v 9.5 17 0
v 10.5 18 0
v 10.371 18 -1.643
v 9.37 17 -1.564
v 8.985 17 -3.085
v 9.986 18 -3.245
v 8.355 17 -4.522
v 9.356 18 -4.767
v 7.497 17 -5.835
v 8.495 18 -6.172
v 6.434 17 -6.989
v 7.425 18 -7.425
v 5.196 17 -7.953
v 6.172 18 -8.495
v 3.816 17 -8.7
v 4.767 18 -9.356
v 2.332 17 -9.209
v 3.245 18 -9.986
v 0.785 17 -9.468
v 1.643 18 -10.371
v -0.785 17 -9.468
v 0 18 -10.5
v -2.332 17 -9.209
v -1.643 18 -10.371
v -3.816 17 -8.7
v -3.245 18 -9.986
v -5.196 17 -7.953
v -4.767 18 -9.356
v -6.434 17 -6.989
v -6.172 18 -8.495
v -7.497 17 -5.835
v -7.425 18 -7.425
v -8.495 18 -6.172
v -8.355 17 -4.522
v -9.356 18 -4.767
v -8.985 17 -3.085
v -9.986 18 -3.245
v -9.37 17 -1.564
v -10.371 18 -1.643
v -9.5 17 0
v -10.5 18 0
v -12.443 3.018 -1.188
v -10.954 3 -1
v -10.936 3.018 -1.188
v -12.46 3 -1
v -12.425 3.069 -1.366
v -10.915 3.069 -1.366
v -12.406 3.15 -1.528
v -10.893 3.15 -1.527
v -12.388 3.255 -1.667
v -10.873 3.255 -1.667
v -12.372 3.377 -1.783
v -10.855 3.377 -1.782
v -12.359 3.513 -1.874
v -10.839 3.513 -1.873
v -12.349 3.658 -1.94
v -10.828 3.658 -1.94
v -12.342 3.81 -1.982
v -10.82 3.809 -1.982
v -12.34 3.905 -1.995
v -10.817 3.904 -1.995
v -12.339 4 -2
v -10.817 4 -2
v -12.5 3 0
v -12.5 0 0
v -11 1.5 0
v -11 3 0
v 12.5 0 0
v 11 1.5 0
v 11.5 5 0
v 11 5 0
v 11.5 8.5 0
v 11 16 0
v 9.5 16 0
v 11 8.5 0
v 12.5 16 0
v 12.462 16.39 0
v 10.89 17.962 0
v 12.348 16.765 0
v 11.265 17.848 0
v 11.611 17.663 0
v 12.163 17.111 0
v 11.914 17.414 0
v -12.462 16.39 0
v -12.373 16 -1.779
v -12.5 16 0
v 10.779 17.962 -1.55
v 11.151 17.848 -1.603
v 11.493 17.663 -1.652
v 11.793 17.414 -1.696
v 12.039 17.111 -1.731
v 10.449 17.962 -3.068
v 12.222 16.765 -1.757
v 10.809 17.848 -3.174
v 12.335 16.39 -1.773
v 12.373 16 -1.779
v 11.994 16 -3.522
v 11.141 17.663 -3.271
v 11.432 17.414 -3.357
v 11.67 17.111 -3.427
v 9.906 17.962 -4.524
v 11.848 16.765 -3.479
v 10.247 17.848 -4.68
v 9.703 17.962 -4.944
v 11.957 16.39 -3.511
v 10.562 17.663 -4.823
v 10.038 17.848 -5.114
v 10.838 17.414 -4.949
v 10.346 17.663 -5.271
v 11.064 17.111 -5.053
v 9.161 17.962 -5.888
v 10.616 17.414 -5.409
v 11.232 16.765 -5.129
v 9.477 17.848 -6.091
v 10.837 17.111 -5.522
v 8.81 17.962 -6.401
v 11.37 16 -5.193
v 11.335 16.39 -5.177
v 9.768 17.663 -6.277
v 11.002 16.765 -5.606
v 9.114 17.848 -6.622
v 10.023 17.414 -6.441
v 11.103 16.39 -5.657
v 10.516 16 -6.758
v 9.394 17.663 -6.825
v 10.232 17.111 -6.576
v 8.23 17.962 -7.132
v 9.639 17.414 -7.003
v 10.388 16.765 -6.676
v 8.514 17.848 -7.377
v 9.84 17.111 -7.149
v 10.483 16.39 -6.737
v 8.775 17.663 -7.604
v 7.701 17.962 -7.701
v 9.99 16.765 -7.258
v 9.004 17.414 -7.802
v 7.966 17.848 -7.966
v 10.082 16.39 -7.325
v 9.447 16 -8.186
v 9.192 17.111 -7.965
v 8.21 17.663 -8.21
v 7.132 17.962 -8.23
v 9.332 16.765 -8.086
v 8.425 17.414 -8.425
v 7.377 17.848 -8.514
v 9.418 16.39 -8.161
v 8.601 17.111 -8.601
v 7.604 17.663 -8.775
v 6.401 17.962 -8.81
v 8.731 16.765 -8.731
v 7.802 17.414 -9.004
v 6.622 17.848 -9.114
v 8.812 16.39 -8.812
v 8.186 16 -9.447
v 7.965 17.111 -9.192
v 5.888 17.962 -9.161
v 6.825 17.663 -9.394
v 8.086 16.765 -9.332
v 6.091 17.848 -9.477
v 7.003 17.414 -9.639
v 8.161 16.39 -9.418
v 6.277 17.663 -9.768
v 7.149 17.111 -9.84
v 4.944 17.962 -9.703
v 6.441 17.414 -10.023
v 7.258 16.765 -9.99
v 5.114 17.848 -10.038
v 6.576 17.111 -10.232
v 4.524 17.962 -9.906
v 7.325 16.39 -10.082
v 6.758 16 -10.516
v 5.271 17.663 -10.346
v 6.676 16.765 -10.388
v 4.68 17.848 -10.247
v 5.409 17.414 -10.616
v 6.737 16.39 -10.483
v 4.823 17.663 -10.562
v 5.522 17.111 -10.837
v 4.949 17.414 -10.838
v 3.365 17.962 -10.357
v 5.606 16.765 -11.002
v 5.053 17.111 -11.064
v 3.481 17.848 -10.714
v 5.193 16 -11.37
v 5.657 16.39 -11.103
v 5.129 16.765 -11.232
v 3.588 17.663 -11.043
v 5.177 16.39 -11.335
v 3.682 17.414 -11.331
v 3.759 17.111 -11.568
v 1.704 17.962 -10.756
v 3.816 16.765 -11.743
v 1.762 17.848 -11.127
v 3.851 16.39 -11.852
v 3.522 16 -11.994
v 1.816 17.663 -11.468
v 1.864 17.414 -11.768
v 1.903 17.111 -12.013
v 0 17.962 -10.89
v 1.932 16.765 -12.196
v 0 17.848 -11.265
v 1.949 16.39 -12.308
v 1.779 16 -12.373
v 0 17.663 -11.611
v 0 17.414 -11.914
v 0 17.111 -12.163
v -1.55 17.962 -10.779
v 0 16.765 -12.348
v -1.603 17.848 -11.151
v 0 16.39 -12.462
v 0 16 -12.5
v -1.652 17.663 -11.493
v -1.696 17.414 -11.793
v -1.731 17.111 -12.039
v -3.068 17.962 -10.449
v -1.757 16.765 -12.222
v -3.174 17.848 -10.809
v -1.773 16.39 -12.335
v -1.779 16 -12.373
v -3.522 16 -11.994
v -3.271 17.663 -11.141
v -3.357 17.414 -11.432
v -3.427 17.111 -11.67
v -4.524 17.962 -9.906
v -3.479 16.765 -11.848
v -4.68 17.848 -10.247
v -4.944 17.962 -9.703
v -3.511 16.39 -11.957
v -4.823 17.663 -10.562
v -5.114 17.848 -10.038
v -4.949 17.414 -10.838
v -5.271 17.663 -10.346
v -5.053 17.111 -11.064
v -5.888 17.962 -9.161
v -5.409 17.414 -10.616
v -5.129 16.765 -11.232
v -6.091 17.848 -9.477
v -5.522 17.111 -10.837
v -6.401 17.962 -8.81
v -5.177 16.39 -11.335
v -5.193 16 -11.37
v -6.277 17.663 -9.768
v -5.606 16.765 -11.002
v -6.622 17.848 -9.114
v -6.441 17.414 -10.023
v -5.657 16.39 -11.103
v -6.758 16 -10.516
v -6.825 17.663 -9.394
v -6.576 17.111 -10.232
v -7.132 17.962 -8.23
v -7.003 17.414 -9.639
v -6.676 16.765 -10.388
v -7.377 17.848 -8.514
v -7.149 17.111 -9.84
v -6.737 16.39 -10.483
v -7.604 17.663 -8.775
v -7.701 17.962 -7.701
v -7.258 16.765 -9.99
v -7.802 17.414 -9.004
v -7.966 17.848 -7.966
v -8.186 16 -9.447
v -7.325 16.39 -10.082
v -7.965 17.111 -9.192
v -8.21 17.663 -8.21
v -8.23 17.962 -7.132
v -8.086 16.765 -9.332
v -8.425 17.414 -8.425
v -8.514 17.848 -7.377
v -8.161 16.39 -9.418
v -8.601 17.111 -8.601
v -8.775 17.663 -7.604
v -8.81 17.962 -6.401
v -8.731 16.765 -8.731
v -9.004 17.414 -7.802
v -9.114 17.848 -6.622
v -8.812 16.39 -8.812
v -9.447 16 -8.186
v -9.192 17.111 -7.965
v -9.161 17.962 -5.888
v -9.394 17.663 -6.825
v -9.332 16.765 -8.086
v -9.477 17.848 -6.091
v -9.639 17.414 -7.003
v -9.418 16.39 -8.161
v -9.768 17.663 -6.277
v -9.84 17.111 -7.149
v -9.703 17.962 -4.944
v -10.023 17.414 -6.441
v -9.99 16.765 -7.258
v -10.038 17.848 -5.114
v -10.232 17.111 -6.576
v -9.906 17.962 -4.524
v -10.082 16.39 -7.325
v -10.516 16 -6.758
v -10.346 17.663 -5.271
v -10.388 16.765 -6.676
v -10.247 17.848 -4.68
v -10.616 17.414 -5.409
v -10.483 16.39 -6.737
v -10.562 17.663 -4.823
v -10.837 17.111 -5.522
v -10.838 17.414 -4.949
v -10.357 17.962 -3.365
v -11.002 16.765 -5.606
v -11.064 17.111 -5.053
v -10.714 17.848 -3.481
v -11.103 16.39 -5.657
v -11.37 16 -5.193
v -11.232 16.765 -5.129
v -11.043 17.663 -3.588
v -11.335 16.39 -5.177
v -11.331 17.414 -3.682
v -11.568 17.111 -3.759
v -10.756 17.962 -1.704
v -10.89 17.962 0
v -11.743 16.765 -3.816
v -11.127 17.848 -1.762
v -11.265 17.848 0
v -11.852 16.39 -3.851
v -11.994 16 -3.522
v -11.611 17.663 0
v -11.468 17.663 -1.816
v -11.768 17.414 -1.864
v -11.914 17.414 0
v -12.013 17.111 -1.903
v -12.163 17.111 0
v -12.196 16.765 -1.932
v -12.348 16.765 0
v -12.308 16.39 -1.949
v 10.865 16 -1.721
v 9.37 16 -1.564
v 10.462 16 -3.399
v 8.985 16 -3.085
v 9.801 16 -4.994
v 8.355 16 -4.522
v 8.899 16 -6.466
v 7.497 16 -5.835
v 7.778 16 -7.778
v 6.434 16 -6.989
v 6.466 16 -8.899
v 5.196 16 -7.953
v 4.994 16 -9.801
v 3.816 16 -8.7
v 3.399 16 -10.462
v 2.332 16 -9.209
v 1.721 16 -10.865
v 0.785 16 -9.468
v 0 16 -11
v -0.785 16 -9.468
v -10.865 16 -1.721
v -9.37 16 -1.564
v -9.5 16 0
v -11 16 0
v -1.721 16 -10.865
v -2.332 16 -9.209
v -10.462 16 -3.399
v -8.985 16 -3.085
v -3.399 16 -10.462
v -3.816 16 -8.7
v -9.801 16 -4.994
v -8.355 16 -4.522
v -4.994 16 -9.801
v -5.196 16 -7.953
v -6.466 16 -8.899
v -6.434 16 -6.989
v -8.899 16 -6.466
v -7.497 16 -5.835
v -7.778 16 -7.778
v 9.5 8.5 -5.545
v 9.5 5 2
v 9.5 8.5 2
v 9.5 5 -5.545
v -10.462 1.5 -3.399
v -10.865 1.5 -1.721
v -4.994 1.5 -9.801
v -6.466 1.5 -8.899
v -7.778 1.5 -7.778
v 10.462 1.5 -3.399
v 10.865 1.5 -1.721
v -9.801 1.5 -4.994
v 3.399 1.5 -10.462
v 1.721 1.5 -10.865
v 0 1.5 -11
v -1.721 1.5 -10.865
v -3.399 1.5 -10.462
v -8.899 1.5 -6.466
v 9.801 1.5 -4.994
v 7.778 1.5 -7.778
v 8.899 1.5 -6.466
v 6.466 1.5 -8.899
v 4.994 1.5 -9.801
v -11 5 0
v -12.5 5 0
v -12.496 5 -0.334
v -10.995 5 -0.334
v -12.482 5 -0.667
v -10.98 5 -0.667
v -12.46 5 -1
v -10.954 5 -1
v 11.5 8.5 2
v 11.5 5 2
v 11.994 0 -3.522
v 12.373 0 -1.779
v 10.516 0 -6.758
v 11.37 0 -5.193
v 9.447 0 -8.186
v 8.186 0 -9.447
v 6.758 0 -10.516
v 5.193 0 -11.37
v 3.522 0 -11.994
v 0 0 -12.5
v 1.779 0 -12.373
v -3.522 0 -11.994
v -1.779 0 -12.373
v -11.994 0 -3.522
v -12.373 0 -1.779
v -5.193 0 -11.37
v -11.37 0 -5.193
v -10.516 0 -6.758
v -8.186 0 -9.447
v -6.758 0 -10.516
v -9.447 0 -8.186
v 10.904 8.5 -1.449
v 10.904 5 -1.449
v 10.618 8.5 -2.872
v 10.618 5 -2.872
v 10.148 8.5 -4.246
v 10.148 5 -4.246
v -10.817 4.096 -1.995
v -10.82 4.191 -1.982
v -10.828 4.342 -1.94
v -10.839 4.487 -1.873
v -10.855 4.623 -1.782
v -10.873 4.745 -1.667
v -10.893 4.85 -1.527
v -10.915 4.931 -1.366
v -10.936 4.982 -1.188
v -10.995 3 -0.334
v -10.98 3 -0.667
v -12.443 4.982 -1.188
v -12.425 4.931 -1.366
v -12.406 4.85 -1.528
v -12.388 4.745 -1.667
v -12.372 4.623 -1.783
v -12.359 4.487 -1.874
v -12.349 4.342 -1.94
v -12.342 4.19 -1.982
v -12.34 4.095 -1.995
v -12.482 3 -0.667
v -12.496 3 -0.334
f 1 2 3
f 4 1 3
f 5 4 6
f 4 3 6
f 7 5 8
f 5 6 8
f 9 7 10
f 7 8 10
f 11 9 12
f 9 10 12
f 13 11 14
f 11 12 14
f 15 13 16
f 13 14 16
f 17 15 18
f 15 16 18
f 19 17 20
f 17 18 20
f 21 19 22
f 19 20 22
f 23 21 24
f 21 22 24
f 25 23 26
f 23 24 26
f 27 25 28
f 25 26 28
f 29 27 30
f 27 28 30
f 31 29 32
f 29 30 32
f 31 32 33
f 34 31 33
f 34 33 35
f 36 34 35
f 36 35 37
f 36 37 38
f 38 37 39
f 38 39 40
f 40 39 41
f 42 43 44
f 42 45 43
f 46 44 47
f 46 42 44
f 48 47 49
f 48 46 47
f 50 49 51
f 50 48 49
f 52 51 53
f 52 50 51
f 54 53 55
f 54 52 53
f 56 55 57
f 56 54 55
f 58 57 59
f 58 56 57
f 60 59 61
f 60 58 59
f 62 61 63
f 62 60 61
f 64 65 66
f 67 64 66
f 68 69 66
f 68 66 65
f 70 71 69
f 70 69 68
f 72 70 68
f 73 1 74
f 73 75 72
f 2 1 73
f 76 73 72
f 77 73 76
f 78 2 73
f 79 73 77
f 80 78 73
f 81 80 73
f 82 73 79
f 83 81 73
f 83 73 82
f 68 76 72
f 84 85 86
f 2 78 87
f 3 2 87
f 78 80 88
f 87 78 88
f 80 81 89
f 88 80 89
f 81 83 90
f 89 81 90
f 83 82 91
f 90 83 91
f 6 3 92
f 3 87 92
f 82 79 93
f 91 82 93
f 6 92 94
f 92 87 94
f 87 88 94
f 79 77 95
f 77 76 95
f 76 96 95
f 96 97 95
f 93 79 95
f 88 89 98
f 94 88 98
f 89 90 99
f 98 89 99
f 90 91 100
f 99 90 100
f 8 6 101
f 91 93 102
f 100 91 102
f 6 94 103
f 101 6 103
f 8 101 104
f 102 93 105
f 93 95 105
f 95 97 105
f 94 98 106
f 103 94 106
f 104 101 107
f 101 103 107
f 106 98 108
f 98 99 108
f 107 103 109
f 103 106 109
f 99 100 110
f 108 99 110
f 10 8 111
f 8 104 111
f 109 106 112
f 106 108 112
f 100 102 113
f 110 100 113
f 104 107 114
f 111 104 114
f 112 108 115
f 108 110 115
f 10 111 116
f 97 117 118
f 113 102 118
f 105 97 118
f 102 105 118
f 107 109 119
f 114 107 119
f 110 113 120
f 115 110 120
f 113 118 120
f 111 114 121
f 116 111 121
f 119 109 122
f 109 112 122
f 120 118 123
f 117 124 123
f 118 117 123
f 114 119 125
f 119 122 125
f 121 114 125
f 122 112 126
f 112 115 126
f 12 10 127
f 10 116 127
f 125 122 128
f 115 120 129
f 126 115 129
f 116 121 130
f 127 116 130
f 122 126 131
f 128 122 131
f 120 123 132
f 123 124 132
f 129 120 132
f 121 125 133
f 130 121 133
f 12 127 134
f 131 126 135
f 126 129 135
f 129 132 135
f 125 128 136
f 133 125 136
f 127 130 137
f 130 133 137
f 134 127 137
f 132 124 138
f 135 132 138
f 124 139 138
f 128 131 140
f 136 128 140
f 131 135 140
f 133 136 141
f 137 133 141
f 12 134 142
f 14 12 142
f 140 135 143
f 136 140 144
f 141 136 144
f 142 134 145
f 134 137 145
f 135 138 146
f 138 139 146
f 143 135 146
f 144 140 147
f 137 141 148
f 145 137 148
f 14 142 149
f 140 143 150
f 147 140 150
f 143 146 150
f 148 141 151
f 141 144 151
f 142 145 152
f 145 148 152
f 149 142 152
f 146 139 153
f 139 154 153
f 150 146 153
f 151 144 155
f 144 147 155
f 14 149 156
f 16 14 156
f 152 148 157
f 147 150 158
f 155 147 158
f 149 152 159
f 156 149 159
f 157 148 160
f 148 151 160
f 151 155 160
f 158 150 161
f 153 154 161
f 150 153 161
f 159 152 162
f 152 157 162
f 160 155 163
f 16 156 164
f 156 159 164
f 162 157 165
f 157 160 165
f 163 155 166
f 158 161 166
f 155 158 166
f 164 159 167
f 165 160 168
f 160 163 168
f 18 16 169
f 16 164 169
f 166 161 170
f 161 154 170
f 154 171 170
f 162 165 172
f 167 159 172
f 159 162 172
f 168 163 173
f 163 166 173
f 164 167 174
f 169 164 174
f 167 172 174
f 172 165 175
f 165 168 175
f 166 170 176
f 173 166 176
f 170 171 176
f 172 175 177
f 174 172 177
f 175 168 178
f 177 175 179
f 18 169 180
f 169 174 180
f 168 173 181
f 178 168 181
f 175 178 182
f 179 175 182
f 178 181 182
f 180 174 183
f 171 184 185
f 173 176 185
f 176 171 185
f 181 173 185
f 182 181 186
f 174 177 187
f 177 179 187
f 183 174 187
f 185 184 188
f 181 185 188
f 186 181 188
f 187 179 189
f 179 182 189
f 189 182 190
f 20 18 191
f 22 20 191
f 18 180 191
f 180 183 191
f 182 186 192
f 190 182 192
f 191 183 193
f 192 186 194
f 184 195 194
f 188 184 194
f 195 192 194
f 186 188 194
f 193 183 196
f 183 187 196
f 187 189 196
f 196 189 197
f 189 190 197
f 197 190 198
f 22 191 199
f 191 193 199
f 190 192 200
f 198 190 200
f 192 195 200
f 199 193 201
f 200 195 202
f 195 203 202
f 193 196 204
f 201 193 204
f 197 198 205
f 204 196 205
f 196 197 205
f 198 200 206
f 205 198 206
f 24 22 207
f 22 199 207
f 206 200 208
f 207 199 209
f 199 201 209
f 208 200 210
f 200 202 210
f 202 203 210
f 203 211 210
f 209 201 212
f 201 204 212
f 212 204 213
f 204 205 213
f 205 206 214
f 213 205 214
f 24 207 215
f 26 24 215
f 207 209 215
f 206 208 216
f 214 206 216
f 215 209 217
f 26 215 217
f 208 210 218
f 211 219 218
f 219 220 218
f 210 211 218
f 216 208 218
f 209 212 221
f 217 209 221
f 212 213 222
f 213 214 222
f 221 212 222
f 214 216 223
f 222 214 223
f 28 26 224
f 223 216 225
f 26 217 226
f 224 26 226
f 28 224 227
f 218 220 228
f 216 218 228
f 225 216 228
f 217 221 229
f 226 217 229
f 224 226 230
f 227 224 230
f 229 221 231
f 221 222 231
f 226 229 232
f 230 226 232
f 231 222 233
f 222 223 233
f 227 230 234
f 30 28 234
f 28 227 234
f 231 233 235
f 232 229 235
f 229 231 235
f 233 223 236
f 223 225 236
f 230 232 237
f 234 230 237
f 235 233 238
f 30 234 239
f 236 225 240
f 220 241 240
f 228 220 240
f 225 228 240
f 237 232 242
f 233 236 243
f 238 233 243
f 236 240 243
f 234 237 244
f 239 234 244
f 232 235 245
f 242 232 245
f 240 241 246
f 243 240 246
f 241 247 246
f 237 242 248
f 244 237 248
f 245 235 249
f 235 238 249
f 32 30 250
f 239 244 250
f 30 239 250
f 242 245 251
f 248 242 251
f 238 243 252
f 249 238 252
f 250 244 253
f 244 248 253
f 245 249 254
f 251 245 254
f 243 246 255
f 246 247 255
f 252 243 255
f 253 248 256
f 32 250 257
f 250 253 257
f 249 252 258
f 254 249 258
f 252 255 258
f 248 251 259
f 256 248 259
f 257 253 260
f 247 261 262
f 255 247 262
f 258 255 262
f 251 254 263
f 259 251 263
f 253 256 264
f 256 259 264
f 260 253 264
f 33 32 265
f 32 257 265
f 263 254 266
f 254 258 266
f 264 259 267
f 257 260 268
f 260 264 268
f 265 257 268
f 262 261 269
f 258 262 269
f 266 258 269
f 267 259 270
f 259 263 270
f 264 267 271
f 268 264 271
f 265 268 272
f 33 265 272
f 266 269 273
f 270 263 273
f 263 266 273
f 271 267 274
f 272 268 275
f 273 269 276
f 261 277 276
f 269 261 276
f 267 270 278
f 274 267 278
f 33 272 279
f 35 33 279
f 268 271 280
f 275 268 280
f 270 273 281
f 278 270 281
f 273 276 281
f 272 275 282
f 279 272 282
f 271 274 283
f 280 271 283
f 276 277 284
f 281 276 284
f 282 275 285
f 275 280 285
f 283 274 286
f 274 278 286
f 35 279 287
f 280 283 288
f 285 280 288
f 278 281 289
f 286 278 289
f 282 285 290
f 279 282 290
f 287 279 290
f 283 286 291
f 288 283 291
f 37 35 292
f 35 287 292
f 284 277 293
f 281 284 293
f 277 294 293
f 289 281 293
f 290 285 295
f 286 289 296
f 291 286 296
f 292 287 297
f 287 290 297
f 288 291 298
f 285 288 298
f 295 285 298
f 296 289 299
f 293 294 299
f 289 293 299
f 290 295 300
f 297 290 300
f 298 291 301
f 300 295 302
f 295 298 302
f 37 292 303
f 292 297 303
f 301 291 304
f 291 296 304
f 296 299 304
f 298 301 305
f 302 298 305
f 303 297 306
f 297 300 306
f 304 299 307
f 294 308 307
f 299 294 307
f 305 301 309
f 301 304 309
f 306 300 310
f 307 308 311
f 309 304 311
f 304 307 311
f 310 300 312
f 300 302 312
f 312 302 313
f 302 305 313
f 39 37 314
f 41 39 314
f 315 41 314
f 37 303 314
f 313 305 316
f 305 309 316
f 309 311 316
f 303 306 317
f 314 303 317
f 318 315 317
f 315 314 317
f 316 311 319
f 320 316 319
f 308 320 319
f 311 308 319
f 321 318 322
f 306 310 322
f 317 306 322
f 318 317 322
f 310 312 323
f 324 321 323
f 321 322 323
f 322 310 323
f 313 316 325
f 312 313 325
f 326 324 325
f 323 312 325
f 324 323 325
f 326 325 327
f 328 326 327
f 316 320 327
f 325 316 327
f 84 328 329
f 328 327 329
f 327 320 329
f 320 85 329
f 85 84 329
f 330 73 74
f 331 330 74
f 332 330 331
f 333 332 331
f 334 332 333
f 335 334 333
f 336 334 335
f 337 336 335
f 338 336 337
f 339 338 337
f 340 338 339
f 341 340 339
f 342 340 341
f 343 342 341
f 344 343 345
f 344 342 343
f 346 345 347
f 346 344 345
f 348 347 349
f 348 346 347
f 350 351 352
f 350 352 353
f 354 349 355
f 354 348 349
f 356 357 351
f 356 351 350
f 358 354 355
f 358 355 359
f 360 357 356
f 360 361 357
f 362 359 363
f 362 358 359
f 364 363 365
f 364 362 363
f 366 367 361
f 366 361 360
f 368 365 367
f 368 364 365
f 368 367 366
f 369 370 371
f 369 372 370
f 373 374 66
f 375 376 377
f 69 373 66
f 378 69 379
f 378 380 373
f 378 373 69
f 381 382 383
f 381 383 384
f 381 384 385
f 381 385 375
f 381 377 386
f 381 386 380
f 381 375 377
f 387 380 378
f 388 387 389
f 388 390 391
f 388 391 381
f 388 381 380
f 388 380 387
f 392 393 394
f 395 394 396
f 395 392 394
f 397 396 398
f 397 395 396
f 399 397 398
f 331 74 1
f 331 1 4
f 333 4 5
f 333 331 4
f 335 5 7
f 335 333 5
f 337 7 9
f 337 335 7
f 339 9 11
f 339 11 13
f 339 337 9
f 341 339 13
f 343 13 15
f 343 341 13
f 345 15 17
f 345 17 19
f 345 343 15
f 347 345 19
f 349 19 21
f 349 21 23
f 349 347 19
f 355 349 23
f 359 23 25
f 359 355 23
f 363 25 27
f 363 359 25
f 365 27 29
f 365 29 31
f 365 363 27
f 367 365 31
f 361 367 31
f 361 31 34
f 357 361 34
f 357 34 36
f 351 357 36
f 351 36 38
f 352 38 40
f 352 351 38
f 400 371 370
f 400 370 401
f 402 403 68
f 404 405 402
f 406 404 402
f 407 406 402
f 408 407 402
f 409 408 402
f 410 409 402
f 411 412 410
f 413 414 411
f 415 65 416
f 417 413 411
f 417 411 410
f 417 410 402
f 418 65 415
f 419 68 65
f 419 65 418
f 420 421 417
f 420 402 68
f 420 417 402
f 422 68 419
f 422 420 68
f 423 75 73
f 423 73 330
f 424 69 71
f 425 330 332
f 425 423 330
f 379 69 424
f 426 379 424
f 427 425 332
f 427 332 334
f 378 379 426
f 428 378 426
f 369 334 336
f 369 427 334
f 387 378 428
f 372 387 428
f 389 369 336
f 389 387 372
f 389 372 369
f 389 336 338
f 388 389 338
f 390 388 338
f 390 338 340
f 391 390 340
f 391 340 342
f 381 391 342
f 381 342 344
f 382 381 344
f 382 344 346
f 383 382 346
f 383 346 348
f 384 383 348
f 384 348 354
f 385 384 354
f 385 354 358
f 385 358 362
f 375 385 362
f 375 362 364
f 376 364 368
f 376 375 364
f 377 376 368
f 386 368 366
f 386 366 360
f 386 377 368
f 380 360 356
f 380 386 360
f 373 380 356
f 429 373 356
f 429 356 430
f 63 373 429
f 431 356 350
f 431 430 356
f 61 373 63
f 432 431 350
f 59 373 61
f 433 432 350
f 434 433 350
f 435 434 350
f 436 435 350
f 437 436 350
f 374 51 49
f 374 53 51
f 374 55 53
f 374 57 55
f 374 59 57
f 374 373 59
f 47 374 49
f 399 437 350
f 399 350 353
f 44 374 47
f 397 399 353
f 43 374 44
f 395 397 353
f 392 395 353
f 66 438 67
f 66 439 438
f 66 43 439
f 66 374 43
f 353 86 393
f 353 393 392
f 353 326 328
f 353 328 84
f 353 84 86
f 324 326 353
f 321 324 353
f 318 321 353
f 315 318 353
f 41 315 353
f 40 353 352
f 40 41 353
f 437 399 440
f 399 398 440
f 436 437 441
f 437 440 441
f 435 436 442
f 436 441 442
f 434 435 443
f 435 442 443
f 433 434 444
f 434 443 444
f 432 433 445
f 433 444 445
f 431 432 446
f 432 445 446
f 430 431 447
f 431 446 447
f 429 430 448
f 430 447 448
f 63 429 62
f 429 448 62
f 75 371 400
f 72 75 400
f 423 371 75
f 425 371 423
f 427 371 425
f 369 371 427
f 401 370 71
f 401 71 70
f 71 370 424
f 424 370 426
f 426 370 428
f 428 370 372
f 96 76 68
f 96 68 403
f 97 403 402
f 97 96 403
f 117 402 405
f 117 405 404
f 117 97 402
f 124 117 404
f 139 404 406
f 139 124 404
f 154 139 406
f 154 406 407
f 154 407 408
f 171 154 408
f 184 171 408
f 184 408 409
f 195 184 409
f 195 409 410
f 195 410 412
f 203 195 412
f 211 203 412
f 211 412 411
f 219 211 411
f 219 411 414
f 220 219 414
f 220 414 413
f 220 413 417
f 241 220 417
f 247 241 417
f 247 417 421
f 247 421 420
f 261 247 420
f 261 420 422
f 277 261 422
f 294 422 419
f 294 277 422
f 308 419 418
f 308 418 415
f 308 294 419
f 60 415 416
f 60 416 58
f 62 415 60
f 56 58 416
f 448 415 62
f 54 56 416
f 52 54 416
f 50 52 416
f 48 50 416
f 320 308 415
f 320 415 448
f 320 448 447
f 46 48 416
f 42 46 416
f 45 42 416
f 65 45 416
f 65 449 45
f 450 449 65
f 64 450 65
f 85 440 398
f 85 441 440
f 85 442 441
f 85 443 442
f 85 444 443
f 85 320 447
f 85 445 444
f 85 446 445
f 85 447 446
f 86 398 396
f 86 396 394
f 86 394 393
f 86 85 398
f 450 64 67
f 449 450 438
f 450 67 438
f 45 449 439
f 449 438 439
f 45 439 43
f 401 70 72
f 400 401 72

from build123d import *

# Parameters (mm, degrees)
R_VOLUTION1_ANGLE              = 180
CHANFREIN1_SIZE                = 1
CONG_1_R                       = 2
ENL_V_MAT_EXTRU_1_REACH        = 27.229
ESQUISSE4_W                    = 4
ESQUISSE4_H                    = 2
CONG_2_R                       = 1
BOSS_EXTRU_2_REACH             = 27.229
BOSS_EXTRU_2_END_RADIUS        = 11
ESQUISSE5_W                    = 2
ESQUISSE5_H                    = 3.5
BOSS_EXTRU_2_DIRECTION_2_DEPTH = 2


with BuildPart() as part:
    # Esquisse3 → Révolution1 (revolve)
    with BuildSketch(Plane.XY):
        Polygon((0, 0), (12.5, 0), (12.5, 18), (9.5, 18), (9.5, 16), (11, 16), (11, 1.5), (0, 1.5), align=None)
    revolve(axis=Axis((0, 0, 0), (0, 1, 0)), revolution_arc=R_VOLUTION1_ANGLE)

    # Chanfrein1
    chanfrein1_edges = [part.edges().sort_by_distance(p)[0] for p in [
        (0, 18, -9.5),
    ]]
    chamfer(chanfrein1_edges, length=CHANFREIN1_SIZE)

    # Congé1
    cong_1_edges = [part.edges().sort_by_distance(p)[0] for p in [
        (0, 18, -12.5),
    ]]
    fillet(cong_1_edges, radius=CONG_1_R - 0.0001)  # a hair under: the kernel refuses the full size

    # Esquisse4 → Enlèv. mat.-Extru.1 (cut, up to next)
    with BuildSketch(Plane(origin=(0, 0, 0), x_dir=(0, 0, -1), z_dir=(1, 0, 0)), mode=Mode.PRIVATE) as enl_v_mat_extru_1_sk1:
        with Locations((0, 4)):
            Rectangle(ESQUISSE4_W, ESQUISSE4_H)
    enl_v_mat_extru_1_tool1 = extrude(enl_v_mat_extru_1_sk1.sketch, amount=-ENL_V_MAT_EXTRU_1_REACH, mode=Mode.PRIVATE) & part.part
    add(enl_v_mat_extru_1_tool1.solids().sort_by_distance((0, 4, 0))[0], mode=Mode.SUBTRACT)

    # Congé2
    cong_2_edges = [part.edges().sort_by_distance(p)[0] for p in [
        (-11.577808253, 5, -2),
        (-11.577808253, 3, -2),
    ]]
    fillet(cong_2_edges, radius=CONG_2_R - 0.0001)  # a hair under: the kernel refuses the full size

    # Boss.-Extru.2: up to this cylinder (the profile starts inside it)
    boss_extru_2_end = Plane(origin=(0, 6.75, 0), z_dir=(0, -1, 0)) * Cylinder(BOSS_EXTRU_2_END_RADIUS, 77.458, mode=Mode.PRIVATE)
    # Esquisse5 → Boss.-Extru.2 (add, up to the surface)
    with BuildSketch(Plane.XY, mode=Mode.PRIVATE) as boss_extru_2_sk1:
        with Locations((10.5, 6.75)):
            Rectangle(ESQUISSE5_W, ESQUISSE5_H)
    boss_extru_2_tool1 = extrude(boss_extru_2_sk1.sketch, amount=-BOSS_EXTRU_2_REACH, mode=Mode.PRIVATE) & boss_extru_2_end
    add(boss_extru_2_tool1.solids().sort_by_distance((10.5, 6.75, 0))[0])

    # Esquisse5 → Boss.-Extru.2 direction 2 (add)
    with BuildSketch(Plane.XY):
        with Locations((10.5, 6.75)):
            Rectangle(ESQUISSE5_W, ESQUISSE5_H)
    extrude(amount=BOSS_EXTRU_2_DIRECTION_2_DEPTH)


solid = part.part
